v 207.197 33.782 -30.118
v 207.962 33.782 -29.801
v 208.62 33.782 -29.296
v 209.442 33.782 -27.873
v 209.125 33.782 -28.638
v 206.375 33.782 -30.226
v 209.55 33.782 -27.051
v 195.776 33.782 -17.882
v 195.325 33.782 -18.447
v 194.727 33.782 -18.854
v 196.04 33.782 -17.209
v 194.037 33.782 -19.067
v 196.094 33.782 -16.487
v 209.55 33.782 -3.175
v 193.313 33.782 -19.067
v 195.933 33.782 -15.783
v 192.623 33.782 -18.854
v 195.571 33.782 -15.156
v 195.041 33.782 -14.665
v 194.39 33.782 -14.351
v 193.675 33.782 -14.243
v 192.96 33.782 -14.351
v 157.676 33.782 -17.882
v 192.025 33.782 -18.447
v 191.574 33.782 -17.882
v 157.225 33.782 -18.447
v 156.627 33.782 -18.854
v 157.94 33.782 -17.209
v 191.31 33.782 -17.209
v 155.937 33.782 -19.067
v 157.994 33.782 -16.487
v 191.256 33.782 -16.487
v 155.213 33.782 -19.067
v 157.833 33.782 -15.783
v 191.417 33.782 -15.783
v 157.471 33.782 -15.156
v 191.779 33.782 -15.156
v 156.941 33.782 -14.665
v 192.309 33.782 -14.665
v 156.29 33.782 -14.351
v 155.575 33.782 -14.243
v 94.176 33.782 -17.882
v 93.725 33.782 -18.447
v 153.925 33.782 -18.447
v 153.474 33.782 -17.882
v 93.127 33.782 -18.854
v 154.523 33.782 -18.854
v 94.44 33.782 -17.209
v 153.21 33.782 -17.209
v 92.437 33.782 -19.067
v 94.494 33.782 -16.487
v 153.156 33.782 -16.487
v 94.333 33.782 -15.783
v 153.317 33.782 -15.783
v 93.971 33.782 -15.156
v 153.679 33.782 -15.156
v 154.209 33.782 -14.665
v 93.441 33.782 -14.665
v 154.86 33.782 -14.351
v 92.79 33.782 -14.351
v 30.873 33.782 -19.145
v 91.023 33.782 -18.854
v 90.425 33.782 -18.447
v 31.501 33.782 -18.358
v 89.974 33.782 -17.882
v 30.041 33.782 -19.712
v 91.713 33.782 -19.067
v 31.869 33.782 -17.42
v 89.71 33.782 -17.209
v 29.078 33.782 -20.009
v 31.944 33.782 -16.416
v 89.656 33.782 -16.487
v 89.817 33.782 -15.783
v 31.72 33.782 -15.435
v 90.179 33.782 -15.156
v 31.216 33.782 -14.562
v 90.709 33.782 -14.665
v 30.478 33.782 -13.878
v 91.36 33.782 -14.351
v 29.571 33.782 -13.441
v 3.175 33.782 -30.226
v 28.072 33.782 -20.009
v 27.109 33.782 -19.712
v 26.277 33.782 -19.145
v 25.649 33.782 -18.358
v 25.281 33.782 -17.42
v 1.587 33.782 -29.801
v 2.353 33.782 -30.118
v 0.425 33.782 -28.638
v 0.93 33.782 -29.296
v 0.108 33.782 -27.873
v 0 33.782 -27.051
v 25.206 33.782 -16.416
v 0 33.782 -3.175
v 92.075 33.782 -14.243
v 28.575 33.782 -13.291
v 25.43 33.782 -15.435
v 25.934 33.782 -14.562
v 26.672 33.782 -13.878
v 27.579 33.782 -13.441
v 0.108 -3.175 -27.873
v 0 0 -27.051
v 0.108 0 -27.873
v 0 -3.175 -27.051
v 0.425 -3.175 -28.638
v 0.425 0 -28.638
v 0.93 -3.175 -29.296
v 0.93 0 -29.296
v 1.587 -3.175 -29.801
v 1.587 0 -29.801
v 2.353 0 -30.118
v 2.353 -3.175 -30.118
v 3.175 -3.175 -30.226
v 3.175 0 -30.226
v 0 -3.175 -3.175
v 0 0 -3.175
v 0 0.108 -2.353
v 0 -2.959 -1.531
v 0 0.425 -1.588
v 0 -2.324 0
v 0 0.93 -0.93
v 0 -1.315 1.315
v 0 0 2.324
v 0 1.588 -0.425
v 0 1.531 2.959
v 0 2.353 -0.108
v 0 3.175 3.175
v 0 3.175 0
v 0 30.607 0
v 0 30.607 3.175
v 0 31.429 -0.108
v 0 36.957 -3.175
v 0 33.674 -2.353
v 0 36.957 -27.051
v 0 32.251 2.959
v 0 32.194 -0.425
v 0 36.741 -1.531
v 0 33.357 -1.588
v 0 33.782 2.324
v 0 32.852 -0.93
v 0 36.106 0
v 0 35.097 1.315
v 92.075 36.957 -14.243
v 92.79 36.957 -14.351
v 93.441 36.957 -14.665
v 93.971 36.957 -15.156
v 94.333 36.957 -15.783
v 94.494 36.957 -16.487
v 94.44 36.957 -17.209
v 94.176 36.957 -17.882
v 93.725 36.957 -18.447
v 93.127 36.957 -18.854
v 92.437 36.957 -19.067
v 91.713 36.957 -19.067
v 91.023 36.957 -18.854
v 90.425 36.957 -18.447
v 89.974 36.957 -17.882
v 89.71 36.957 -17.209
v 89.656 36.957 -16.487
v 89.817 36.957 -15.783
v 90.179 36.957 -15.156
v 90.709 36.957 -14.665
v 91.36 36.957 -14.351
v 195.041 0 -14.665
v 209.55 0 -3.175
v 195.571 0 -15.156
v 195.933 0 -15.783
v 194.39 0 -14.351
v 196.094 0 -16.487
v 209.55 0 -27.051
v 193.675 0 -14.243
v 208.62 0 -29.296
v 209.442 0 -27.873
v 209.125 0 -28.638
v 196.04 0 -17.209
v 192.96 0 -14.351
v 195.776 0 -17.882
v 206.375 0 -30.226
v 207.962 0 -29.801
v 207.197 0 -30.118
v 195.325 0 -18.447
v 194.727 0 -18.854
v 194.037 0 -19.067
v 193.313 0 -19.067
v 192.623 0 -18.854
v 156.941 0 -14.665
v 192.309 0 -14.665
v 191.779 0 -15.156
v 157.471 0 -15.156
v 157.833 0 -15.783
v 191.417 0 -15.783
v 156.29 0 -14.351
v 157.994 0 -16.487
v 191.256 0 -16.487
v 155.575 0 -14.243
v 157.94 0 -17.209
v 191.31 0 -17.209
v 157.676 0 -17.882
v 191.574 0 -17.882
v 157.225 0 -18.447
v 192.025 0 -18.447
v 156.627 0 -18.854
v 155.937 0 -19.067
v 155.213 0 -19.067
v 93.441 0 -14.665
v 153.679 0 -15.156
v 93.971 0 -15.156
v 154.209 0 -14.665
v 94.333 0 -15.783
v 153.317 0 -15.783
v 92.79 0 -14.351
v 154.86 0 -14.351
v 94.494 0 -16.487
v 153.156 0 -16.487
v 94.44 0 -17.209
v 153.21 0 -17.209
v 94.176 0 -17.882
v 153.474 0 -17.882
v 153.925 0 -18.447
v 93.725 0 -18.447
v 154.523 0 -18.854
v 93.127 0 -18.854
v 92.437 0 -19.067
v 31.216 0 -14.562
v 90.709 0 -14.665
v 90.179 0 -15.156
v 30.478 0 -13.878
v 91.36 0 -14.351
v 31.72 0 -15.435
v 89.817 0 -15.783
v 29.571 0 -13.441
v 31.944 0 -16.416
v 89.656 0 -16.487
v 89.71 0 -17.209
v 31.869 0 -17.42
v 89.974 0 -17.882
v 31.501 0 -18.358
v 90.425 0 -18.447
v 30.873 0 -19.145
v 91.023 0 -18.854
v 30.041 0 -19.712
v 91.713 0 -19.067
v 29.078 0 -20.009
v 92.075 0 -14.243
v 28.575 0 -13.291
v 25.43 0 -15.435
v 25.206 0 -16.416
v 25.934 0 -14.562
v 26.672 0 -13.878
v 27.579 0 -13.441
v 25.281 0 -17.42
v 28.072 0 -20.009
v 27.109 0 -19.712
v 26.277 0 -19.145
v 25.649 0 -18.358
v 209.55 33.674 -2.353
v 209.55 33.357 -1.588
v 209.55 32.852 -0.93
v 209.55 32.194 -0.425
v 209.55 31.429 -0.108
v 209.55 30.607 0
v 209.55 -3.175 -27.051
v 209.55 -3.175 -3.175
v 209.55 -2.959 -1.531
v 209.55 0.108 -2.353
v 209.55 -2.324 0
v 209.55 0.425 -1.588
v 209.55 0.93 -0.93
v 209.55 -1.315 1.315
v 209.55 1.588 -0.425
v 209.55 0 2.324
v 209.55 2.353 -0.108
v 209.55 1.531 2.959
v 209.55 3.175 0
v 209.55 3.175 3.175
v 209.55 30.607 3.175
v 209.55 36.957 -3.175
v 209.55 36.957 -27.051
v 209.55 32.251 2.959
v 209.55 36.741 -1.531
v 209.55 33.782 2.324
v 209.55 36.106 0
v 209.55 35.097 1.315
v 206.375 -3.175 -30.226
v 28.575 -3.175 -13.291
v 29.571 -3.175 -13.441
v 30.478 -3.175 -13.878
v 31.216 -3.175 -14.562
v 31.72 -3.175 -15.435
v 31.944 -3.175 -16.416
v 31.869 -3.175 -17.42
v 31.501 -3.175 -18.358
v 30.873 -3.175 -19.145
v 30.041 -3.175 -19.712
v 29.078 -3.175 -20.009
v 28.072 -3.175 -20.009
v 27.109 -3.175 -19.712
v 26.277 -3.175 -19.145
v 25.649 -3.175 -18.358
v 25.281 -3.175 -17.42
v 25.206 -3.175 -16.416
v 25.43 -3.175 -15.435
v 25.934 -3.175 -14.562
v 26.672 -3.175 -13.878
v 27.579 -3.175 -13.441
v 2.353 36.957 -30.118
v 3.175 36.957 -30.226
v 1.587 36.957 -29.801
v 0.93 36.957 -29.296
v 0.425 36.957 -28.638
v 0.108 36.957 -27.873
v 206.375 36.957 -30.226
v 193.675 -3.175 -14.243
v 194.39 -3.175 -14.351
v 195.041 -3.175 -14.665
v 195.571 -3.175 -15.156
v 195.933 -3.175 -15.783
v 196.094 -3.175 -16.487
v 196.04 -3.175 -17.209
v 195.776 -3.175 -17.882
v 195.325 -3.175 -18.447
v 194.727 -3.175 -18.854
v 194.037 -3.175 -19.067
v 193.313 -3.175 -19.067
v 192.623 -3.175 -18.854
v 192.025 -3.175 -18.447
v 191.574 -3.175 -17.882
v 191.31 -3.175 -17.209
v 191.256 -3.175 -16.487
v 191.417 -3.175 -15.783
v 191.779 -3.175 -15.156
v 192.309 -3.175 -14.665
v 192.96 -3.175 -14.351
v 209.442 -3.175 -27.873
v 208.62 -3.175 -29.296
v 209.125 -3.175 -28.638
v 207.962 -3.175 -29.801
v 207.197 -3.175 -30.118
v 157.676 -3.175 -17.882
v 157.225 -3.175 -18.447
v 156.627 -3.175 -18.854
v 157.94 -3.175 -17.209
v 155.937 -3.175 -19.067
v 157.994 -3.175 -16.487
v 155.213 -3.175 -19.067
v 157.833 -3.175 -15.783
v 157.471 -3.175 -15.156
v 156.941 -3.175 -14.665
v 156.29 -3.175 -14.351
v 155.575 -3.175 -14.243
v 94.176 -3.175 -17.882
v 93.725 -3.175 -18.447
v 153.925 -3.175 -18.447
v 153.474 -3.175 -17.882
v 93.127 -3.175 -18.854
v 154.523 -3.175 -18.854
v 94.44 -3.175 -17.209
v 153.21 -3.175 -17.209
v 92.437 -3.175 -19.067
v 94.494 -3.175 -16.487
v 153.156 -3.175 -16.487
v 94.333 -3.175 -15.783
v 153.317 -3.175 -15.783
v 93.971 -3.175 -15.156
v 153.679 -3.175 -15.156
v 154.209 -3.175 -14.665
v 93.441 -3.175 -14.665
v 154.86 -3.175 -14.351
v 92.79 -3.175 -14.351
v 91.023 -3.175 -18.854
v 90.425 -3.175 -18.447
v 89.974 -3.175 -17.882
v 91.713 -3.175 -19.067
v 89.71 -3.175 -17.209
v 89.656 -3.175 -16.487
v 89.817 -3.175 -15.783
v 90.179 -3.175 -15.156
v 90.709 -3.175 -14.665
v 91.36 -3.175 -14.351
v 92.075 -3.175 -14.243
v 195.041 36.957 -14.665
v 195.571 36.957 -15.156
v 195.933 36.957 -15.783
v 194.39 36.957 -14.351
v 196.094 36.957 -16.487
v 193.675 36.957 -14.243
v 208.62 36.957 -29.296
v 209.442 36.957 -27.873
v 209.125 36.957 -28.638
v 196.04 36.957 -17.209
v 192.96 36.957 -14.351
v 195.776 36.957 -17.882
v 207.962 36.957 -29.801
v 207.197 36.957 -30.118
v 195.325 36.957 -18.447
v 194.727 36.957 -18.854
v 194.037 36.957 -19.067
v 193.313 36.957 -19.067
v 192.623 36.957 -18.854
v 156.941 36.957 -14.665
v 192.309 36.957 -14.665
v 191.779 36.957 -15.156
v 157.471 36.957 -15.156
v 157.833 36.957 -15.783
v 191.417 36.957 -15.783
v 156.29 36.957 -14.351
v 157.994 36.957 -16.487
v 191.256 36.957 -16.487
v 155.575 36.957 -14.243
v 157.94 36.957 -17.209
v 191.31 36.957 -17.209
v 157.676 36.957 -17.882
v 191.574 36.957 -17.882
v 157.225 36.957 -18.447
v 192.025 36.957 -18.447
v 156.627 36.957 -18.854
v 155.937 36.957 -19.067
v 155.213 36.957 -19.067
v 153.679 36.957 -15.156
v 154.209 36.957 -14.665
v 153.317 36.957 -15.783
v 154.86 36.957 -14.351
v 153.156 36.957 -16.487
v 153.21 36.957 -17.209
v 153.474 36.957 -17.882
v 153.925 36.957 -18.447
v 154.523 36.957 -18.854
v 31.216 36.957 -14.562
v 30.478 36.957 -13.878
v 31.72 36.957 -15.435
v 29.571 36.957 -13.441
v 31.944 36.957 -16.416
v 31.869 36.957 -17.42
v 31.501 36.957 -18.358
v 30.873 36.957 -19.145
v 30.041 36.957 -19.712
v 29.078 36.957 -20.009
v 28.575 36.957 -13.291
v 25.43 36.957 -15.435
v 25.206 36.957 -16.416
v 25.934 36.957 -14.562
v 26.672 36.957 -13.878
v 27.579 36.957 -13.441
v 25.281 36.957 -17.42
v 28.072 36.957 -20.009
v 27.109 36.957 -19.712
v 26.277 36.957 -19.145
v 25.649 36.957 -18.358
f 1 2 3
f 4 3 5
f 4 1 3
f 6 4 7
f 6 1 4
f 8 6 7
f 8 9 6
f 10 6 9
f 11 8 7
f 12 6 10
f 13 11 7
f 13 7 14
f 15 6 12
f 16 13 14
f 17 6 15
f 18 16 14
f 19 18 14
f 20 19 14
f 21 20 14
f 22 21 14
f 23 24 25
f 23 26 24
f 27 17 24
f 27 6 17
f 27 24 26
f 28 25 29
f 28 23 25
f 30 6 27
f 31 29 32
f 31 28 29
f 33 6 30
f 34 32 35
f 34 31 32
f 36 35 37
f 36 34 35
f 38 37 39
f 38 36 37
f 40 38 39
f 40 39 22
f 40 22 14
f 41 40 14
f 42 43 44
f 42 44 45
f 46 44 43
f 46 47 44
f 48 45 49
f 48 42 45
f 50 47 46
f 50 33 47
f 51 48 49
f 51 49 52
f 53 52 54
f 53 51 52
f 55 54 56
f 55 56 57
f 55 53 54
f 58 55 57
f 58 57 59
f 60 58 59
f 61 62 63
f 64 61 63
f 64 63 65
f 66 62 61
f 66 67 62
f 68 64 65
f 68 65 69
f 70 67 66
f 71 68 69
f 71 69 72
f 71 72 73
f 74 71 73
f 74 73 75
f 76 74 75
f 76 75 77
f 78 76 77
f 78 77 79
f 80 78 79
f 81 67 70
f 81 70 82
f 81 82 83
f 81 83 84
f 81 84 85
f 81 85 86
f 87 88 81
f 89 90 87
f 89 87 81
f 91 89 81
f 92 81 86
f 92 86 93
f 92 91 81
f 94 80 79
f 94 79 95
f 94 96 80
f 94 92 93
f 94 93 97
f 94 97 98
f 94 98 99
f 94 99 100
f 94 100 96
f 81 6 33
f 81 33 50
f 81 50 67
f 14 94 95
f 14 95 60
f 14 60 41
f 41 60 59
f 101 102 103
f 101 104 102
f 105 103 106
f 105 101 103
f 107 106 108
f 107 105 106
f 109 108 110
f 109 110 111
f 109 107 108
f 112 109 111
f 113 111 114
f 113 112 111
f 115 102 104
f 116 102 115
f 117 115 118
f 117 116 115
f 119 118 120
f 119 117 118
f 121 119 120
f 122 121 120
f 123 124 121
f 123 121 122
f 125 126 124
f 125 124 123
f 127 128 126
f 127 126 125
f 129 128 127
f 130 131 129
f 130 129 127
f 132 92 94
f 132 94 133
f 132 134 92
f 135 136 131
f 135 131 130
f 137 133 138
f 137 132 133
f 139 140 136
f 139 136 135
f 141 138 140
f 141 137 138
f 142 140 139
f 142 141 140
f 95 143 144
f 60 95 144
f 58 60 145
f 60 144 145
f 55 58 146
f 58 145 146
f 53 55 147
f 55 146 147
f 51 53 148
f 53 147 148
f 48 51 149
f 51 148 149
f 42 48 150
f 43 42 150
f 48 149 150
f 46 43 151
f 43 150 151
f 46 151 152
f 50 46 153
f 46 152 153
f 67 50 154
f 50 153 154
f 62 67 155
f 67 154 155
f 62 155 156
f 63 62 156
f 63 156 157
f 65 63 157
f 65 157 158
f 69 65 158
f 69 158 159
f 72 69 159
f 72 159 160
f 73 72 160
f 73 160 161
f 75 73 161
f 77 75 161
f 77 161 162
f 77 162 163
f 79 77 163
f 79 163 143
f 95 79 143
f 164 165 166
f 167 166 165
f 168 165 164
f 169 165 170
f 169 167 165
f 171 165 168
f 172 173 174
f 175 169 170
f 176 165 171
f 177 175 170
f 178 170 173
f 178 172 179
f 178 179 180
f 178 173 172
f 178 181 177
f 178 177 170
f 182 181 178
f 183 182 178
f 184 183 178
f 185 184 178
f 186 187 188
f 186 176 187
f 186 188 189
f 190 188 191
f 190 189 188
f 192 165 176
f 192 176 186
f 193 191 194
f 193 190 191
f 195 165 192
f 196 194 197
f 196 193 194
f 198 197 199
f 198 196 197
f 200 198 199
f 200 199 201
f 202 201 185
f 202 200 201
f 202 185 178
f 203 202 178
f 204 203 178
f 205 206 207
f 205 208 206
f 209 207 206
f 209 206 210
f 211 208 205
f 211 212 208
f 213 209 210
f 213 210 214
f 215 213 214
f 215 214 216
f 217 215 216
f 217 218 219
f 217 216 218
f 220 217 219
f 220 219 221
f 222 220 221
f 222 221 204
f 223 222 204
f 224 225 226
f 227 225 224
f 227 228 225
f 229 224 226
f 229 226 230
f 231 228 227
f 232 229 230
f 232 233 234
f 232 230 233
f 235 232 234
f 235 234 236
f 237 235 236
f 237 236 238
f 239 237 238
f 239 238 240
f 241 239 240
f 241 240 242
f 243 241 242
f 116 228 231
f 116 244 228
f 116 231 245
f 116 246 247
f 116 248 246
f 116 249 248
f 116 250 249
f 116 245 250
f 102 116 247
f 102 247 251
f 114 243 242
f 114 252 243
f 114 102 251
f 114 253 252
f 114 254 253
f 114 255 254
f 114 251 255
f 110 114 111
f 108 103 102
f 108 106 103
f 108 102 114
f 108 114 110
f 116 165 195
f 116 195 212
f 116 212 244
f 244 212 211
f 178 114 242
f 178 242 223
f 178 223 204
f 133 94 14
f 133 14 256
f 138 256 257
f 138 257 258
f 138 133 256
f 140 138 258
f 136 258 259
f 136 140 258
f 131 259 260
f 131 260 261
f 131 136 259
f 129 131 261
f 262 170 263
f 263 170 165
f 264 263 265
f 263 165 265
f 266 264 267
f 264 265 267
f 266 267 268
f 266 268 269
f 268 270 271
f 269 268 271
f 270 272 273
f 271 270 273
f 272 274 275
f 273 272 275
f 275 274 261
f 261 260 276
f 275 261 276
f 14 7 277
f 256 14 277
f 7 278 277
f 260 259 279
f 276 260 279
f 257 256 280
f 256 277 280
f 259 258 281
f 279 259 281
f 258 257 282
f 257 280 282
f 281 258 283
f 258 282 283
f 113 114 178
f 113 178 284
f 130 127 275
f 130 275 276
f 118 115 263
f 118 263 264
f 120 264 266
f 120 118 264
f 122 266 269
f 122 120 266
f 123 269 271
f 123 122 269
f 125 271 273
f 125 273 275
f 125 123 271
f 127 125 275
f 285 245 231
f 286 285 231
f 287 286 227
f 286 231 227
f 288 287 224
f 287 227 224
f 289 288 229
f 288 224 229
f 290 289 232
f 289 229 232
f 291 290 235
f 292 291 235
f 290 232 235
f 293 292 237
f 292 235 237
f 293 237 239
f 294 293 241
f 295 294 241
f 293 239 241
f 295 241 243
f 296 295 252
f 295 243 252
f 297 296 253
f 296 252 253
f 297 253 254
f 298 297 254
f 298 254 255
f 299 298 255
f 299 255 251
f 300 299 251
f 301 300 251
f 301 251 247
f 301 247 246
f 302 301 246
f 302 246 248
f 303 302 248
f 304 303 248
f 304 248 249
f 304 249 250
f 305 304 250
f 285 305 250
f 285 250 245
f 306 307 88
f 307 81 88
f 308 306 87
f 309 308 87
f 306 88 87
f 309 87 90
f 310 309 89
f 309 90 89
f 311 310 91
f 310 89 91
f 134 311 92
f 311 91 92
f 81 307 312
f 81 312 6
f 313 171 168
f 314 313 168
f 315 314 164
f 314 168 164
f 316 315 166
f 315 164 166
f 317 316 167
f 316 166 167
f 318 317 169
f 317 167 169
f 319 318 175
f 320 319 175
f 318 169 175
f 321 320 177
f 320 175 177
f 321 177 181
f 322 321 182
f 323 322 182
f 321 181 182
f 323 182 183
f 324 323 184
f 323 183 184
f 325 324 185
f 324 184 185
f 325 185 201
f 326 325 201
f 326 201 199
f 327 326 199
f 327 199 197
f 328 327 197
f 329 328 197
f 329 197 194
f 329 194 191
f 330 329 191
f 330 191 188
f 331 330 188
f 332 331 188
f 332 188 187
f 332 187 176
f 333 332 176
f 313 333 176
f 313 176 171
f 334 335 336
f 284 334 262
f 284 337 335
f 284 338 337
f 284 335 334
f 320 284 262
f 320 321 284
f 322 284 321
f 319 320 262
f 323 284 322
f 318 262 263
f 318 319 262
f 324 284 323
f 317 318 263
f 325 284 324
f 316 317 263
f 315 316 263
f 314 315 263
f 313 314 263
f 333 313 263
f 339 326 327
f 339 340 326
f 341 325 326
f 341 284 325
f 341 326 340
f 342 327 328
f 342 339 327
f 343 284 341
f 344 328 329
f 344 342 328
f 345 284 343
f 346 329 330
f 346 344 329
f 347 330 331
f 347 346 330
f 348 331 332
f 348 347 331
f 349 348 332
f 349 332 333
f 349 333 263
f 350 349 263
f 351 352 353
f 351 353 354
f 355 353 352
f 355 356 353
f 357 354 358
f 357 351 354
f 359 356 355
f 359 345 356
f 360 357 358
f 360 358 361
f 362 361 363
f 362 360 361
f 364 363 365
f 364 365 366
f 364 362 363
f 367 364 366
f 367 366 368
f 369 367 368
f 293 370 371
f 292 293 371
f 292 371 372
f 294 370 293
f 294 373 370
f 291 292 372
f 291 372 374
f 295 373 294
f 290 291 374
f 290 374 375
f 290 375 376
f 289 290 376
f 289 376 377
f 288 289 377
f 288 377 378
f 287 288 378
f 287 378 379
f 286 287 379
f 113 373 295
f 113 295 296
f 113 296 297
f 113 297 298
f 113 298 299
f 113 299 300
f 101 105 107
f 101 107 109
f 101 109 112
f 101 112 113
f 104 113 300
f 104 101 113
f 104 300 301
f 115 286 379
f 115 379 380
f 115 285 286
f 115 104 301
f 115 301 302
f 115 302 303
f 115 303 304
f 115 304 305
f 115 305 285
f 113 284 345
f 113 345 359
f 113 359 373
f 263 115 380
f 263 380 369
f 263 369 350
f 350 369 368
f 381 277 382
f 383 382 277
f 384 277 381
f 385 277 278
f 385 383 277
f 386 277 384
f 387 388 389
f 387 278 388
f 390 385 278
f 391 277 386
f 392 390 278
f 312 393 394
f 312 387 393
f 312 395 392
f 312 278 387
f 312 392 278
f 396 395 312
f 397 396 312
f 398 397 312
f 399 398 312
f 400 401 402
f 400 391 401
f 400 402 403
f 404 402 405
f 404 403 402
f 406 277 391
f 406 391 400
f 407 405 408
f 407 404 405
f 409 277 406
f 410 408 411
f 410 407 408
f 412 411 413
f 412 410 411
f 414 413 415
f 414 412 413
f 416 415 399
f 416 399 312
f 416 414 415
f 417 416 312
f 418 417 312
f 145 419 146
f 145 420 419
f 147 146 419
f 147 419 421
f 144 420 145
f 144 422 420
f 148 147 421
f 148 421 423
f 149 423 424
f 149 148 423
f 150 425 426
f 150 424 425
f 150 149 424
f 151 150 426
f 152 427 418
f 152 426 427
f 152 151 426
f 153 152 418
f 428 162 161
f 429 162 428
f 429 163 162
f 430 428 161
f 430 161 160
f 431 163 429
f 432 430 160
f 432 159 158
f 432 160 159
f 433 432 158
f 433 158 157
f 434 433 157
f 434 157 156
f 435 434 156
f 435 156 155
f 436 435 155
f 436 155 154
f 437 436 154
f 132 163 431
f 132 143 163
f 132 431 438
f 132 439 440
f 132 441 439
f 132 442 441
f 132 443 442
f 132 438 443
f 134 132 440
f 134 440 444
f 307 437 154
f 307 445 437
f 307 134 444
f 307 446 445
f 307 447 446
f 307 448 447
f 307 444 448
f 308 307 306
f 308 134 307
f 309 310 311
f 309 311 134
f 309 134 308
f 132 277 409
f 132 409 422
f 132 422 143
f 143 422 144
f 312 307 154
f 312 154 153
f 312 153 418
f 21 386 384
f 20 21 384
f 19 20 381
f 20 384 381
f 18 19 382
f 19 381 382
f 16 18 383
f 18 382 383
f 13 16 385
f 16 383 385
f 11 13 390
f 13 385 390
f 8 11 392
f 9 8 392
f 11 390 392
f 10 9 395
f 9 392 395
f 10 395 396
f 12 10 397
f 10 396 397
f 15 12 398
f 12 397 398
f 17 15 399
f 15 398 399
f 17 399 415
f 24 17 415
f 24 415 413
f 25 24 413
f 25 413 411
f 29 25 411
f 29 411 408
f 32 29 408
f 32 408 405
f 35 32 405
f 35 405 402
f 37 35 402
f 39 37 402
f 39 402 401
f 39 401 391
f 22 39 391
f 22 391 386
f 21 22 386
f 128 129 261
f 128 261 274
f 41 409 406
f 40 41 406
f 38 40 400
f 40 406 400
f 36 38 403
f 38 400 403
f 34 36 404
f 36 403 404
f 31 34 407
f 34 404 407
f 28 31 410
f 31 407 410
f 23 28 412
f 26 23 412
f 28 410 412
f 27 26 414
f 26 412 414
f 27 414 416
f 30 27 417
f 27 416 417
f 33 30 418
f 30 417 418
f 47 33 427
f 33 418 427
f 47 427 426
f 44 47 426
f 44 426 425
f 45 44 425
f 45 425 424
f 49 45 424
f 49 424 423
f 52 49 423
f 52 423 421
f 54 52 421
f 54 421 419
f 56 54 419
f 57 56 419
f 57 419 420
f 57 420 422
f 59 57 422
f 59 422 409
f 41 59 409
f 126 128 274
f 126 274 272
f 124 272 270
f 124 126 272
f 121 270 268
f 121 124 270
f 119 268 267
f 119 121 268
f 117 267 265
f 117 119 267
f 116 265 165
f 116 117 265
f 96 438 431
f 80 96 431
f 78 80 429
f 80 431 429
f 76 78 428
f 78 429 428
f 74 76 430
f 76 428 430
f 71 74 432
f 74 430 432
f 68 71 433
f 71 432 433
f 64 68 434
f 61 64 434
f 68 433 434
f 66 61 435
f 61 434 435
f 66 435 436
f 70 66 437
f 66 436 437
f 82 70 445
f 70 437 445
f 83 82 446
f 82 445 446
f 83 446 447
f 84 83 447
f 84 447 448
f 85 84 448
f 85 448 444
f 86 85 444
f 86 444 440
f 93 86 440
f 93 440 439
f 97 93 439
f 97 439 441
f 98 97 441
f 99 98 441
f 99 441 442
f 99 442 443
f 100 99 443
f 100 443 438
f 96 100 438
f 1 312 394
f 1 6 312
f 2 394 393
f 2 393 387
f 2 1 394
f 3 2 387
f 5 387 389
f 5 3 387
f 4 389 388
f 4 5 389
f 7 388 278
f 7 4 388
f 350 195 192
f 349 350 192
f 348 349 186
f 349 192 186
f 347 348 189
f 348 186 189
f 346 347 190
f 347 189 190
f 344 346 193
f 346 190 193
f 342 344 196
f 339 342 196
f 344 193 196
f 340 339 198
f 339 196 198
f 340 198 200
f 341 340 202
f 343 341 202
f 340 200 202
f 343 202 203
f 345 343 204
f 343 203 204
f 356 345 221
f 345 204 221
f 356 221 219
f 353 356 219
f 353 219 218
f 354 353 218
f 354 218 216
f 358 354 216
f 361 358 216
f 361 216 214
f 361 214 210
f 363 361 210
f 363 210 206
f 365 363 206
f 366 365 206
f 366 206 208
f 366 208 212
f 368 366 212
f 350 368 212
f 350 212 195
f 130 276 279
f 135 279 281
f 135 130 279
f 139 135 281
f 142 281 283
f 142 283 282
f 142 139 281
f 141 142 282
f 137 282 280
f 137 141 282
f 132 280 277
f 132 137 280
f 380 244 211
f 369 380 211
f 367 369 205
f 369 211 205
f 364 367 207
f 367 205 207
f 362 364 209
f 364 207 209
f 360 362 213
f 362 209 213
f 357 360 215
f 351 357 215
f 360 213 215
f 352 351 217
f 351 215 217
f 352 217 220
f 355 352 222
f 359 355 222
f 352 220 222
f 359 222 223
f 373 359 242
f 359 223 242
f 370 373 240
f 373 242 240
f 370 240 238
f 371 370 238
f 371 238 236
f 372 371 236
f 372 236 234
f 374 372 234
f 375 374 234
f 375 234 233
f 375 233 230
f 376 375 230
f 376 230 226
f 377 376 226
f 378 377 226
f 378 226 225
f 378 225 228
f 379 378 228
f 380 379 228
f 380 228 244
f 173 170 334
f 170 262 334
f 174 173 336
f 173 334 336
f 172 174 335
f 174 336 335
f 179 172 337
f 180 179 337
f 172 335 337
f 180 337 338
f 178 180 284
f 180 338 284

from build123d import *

# Parameters (mm, degrees)
BASE_FLANGE1_DEPTH = 209.55
SKETCH6_R          = 3.3782
SKETCH6_R_2        = 2.4257
CUT_EXTRUDE1_DEPTH = 216.488725923
FILLET1_R          = 3.175


# Sheet-metal steps are written as plain solids
with BuildPart() as part:
    # Sketch1 → Base-Flange1 (new body)
    with BuildSketch(Plane(origin=(0, 0, 0), x_dir=(0, 0, -1), z_dir=(1, 0, 0))):
        with BuildLine():
            Line((30.226, 33.782), (3.175, 33.782))
            ThreePointArc((3.175, 33.782), (0.92993597, 32.85206403), (0, 30.607))
            Line((0, 30.607), (0, 3.175))
            ThreePointArc((0, 3.175), (0.92993597, 0.92993597), (3.175, 0))
            Line((3.175, 0), (30.226, 0))
            Line((30.226, 0), (30.226, -3.175))
            Line((30.226, -3.175), (3.175, -3.175))
            ThreePointArc((3.175, -3.175), (-1.315128061, -1.315128061), (-3.175, 3.175))
            Line((-3.175, 3.175), (-3.175, 30.607))
            ThreePointArc((-3.175, 30.607), (-1.315128061, 35.097128061), (3.175, 36.957))
            Line((3.175, 36.957), (30.226, 36.957))
            Line((30.226, 36.957), (30.226, 33.782))
        make_face()
    extrude(amount=BASE_FLANGE1_DEPTH)

    # Sketch6 → Cut-Extrude1 (cut, through all)
    with BuildSketch(Plane(origin=(0, 36.957, 0), x_dir=(1, 0, 0), z_dir=(0, 1, 0))):
        with Locations(Location((28.575, 16.66875, 0), (0, 0, 270))):
            Circle(SKETCH6_R)
        with Locations(Location((92.075, 16.66875, 0), (0, 0, 270))):
            Circle(SKETCH6_R_2)
        with Locations(Location((155.575, 16.66875, 0), (0, 0, 270))):
            Circle(SKETCH6_R_2)
        with Locations(Location((193.675, 16.66875, 0), (0, 0, 270))):
            Circle(SKETCH6_R_2)
    extrude(amount=-CUT_EXTRUDE1_DEPTH, mode=Mode.SUBTRACT)

    # Fillet1
    fillet1_edges = [part.edges().sort_by_distance(p)[0] for p in [
        (0, -1.5875, -30.226),
        (0, 35.3695, -30.226),
        (209.55, -1.5875, -30.226),
        (209.55, 35.3695, -30.226),
    ]]
    fillet(fillet1_edges, radius=FILLET1_R)


solid = part.part
